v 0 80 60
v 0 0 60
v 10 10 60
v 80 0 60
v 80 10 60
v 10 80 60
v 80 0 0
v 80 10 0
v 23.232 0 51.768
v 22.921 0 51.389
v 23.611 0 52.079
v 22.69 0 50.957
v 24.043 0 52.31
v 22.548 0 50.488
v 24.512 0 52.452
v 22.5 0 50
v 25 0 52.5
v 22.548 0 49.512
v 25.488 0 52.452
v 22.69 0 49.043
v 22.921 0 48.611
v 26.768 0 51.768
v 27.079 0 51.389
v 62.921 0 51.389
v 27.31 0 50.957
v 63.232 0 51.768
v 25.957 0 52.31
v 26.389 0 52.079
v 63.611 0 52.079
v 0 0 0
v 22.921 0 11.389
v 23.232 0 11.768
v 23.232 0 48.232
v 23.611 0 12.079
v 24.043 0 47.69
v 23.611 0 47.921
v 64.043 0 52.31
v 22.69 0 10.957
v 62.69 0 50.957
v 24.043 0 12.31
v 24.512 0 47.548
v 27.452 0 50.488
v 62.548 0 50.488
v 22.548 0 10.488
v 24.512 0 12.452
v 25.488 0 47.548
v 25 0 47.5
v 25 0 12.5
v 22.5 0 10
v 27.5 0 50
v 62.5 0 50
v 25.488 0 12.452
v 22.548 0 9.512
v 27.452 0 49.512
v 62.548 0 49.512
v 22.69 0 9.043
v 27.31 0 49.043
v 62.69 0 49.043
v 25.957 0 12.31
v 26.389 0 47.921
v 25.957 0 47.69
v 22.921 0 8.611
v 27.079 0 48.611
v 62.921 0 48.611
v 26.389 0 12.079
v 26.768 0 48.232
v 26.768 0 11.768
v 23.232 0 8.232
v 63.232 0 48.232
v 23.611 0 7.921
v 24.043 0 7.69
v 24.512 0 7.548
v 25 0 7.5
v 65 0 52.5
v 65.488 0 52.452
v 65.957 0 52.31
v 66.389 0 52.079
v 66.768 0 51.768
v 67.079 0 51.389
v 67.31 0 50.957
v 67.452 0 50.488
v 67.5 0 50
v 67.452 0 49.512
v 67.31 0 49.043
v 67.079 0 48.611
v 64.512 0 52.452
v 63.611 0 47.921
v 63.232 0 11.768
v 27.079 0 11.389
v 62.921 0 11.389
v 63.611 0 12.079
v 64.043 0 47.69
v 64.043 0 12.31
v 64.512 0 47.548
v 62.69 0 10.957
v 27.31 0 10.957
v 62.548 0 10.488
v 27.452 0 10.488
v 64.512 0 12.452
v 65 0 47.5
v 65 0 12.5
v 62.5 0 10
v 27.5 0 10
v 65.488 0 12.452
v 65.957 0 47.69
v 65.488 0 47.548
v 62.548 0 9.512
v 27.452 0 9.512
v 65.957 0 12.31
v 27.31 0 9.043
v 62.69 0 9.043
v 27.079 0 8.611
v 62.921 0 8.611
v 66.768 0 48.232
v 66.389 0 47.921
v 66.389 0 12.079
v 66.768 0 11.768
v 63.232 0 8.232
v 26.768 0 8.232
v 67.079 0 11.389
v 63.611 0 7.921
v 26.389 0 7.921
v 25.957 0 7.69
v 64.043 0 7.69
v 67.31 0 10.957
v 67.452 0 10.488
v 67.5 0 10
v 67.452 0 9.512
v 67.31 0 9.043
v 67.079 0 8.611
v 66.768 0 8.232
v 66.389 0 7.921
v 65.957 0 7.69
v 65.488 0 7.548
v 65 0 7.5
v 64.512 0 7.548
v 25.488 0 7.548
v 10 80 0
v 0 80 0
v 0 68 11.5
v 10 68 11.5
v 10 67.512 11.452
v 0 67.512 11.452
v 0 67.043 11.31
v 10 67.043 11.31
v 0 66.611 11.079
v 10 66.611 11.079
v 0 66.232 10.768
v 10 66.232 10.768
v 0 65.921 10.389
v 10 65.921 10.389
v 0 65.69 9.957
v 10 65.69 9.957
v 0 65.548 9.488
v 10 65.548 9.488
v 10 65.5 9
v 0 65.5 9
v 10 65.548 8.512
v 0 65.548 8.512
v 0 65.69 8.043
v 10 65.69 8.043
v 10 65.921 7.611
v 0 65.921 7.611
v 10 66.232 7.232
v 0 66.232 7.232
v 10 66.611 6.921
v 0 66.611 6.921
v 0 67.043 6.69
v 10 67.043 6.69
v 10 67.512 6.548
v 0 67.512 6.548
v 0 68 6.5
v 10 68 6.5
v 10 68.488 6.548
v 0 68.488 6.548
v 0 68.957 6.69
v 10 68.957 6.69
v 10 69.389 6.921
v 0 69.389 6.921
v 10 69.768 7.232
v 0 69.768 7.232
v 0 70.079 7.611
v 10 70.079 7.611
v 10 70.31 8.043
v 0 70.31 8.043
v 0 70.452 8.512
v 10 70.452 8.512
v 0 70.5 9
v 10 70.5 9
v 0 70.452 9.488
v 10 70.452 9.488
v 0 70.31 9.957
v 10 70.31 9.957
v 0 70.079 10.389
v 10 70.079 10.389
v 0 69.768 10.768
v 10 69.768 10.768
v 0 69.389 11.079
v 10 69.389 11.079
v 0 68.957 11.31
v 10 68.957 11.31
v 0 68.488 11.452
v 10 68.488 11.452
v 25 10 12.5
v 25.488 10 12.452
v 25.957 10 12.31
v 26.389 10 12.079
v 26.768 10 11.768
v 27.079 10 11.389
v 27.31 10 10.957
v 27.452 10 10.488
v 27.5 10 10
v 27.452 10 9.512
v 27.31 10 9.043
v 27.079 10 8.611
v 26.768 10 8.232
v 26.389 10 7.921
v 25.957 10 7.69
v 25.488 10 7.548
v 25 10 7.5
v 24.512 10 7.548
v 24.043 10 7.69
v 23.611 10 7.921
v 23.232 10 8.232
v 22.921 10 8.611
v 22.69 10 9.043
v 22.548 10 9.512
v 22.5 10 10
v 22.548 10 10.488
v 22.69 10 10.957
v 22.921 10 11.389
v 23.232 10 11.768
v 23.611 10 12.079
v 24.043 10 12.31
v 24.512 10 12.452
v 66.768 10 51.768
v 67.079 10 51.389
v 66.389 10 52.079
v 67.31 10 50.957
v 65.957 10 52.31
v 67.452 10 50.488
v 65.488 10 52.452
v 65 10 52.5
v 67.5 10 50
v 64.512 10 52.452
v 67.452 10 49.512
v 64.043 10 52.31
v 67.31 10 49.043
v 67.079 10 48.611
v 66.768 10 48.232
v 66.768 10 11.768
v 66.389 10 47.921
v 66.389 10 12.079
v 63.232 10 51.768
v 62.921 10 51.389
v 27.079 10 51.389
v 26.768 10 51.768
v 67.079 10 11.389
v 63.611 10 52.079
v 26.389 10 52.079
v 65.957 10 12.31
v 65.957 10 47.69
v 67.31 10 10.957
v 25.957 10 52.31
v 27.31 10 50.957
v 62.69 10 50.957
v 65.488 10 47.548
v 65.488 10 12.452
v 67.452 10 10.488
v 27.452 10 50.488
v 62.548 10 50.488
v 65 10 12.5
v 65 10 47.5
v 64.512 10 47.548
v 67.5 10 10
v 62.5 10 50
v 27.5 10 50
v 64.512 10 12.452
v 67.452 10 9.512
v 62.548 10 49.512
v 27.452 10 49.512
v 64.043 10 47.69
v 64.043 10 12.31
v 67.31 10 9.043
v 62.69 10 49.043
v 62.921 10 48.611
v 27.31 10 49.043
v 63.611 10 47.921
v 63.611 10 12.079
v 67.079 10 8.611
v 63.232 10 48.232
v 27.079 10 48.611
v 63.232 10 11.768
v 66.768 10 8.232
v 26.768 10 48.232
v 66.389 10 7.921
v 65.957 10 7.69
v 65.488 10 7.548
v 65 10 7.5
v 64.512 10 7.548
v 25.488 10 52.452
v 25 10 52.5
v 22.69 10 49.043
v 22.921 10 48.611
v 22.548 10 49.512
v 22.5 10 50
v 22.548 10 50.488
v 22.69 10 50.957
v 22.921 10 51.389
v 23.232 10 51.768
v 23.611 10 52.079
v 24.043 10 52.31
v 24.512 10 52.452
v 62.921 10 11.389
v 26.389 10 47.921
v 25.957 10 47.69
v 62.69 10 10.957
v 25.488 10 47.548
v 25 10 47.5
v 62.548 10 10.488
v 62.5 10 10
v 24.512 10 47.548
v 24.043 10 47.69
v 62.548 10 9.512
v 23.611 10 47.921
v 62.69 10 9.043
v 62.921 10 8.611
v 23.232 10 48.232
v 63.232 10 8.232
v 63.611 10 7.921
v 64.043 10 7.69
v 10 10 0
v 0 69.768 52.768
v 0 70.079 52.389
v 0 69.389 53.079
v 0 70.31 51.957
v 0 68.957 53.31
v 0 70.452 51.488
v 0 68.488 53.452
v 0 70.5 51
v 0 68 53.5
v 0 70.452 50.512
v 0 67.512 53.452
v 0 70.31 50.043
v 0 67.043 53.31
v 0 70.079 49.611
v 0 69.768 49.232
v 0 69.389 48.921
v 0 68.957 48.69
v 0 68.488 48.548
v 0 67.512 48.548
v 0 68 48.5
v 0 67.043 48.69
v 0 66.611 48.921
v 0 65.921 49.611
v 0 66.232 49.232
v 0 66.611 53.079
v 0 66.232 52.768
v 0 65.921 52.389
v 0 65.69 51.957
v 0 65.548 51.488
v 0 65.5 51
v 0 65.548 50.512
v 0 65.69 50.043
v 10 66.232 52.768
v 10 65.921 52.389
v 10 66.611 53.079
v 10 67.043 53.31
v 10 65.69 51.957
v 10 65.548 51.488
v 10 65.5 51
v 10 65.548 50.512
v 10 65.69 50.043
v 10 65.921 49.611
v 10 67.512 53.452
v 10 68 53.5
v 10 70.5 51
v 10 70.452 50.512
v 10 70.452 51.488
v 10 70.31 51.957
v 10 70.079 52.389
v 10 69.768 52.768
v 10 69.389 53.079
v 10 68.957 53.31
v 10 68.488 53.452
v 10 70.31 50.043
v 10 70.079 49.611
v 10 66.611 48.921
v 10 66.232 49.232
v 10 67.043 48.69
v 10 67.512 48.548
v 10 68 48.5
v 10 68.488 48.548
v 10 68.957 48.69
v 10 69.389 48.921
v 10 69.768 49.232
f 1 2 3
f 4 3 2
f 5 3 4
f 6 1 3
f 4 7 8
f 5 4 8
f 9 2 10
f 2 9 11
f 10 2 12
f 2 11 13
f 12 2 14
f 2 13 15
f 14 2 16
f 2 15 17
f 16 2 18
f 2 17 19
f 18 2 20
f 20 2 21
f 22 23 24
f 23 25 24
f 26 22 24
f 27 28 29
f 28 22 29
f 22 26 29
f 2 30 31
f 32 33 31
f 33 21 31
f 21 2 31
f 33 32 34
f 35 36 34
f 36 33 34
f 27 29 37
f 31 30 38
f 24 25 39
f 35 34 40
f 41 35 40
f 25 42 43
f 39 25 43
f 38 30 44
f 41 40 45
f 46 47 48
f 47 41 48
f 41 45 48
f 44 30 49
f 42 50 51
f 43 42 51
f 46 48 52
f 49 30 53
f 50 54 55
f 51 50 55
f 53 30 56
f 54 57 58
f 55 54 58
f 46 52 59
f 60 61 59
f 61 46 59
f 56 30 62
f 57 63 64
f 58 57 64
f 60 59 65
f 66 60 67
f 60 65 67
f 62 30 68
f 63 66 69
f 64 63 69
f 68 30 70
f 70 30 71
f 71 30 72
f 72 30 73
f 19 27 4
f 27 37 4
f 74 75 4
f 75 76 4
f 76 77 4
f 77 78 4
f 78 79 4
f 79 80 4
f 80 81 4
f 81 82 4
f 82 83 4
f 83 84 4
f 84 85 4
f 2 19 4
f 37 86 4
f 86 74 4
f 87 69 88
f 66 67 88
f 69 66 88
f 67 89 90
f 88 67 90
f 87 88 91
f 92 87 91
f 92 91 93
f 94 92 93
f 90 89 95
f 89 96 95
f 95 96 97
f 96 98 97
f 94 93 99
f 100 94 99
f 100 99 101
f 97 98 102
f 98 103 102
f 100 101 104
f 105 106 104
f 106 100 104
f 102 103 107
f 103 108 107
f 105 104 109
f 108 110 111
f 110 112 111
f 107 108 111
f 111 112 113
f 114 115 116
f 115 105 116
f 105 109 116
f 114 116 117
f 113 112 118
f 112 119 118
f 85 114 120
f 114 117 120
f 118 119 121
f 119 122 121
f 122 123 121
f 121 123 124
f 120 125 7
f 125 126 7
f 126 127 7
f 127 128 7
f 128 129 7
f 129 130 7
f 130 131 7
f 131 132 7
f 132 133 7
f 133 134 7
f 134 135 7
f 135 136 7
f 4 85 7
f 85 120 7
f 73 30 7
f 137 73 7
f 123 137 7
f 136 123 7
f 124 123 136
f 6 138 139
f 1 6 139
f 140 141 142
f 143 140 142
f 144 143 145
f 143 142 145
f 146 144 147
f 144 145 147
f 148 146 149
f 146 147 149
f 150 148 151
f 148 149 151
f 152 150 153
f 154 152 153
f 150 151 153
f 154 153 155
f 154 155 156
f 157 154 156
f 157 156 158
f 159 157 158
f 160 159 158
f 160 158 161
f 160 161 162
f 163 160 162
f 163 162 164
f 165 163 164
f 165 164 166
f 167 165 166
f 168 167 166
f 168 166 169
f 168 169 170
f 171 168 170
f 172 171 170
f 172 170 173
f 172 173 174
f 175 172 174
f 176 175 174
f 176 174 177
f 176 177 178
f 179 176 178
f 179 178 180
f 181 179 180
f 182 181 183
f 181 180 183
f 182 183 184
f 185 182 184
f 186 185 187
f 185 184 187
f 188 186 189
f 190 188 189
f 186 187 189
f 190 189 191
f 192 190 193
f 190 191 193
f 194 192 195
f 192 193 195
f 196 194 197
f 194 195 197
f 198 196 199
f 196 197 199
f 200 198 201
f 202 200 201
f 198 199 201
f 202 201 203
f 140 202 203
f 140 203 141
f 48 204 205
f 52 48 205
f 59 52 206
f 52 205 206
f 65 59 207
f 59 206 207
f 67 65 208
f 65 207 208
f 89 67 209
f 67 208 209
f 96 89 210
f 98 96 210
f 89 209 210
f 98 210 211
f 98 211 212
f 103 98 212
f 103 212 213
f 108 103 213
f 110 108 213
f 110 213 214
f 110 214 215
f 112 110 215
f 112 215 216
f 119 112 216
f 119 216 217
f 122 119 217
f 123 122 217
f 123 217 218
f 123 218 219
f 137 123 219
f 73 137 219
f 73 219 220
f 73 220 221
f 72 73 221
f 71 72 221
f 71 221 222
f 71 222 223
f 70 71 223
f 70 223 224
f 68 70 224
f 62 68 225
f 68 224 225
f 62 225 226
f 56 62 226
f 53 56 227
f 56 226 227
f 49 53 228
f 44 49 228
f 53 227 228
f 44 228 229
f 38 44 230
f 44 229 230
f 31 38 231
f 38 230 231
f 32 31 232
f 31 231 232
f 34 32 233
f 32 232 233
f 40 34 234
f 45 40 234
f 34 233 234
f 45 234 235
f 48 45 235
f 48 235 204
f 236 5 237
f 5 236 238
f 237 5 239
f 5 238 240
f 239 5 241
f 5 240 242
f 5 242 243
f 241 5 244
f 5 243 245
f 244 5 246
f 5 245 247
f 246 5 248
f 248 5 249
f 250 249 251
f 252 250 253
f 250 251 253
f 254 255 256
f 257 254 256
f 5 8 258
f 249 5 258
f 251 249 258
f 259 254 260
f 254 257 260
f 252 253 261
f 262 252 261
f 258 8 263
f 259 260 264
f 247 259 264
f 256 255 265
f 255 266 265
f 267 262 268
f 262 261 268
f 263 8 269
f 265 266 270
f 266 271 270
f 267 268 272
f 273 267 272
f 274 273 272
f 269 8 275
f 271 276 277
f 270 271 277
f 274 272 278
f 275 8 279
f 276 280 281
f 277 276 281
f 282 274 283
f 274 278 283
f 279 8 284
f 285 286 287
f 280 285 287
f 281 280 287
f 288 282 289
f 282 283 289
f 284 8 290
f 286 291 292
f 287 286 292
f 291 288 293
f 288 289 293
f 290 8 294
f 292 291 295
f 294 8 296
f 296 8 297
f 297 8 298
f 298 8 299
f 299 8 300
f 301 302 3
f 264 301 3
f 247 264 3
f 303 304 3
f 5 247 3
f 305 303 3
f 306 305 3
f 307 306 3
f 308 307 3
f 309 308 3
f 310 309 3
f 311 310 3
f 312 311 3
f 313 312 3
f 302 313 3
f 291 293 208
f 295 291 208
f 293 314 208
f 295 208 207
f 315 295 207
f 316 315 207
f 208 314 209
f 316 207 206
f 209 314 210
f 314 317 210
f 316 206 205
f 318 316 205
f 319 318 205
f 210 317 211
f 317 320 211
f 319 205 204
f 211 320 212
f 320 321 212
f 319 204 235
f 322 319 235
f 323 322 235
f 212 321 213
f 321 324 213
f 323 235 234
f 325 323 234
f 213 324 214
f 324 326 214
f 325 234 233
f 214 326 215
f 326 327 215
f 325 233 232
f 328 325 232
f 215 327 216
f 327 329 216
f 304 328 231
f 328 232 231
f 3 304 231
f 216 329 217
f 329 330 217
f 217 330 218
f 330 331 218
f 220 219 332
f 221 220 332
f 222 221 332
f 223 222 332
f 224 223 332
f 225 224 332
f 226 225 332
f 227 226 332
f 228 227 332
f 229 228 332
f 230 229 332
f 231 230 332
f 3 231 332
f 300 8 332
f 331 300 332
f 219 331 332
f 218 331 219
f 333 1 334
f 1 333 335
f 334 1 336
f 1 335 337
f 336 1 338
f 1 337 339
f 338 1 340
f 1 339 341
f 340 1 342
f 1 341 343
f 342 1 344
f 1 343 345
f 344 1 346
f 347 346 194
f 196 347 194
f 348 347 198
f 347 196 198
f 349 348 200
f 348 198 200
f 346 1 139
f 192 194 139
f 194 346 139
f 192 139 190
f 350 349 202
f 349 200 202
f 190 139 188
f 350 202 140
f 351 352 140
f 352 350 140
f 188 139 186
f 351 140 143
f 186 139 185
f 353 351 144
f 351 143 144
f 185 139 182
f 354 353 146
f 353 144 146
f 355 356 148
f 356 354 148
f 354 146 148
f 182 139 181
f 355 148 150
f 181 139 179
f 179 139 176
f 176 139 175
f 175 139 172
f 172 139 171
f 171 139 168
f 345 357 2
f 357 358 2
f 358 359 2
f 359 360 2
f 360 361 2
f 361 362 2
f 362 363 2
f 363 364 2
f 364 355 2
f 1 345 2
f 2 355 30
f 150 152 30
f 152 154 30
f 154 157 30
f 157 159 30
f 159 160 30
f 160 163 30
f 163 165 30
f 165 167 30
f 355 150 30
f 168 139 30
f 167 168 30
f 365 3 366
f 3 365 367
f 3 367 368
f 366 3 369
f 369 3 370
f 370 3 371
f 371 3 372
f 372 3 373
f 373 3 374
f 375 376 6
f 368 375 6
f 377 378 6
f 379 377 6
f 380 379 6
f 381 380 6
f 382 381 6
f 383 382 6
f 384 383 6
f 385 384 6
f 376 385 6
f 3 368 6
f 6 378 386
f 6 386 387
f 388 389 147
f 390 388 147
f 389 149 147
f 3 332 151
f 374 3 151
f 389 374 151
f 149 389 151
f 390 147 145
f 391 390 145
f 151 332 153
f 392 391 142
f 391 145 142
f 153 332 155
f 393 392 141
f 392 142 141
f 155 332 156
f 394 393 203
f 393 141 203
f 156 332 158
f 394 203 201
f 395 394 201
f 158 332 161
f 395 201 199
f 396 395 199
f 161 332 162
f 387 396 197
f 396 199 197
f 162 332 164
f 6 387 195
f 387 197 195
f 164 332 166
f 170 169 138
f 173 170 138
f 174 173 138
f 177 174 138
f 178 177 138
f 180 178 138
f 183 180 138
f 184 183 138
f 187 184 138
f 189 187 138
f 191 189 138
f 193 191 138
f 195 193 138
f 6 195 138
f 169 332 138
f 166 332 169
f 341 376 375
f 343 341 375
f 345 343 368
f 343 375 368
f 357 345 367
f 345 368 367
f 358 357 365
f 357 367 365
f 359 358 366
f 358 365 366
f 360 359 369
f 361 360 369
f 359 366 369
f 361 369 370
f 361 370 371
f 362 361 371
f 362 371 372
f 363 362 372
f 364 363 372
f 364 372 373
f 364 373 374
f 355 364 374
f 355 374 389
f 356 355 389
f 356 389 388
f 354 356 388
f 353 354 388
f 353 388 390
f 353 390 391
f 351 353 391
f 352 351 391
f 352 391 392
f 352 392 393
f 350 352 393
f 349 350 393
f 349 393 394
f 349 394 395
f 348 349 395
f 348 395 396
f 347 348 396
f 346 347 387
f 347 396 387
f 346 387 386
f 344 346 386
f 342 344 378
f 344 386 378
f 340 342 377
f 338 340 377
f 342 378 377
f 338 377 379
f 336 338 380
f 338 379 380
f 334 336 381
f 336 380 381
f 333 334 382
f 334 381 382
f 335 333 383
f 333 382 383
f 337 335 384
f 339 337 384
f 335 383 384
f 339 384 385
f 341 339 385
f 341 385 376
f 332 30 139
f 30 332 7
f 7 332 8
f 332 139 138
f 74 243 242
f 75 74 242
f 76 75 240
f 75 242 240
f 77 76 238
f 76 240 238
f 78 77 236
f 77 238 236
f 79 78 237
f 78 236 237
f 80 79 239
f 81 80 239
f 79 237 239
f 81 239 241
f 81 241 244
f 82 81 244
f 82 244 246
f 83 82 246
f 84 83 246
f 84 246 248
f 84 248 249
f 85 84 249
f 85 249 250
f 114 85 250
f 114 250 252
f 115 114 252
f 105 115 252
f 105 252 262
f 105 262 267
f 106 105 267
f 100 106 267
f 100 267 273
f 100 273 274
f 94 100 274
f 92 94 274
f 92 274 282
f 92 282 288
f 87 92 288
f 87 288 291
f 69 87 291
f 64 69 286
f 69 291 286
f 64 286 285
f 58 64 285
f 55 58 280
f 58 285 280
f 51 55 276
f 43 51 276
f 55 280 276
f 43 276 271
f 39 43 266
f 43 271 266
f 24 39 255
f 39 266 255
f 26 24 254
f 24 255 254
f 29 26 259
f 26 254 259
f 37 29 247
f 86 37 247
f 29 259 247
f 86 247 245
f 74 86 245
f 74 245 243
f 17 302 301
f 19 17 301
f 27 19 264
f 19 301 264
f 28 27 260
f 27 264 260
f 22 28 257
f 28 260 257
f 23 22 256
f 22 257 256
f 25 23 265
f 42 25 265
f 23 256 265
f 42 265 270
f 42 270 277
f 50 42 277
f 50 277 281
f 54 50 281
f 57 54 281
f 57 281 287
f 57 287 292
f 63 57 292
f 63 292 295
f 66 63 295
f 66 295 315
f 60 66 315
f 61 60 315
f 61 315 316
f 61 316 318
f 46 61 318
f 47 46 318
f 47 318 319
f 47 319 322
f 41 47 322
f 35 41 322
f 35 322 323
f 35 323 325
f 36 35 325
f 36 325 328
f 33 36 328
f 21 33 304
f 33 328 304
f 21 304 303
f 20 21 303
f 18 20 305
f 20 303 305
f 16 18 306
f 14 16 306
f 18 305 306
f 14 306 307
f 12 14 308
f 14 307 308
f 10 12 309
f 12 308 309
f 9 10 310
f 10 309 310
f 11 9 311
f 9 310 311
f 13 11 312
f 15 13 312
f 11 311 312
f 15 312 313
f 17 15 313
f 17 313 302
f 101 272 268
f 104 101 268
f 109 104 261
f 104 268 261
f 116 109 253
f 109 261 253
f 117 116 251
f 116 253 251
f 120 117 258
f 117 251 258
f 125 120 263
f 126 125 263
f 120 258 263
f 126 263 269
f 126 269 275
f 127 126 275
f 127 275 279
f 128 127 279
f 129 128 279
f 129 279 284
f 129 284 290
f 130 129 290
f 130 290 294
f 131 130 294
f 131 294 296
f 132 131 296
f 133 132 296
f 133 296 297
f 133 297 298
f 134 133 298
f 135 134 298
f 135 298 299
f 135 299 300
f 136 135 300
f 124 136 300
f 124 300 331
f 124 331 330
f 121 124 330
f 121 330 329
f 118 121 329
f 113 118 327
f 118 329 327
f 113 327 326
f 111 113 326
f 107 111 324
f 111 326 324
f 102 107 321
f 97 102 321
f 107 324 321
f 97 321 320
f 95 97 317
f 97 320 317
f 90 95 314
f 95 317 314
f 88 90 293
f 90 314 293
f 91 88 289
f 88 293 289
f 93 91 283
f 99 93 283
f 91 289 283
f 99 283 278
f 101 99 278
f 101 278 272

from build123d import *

# Parameters (mm, degrees)
EXTRUDE_1_DEPTH        = 60
HOLE_WIZARD_M6_1_D     = 5
HOLE_WIZARD_M6_1_DEPTH = 15
HOLE_WIZARD_M6_1_TIP   = 1.502151548
HOLE_WIZARD_M6_2_D     = 5
HOLE_WIZARD_M6_2_DEPTH = 15
HOLE_WIZARD_M6_2_TIP   = 1.502151548


with BuildPart() as part:
    # 草图1 → 凸台-拉伸1 (new body)
    with BuildSketch(Plane.XY):
        Polygon((0, 80), (0, 0), (80, 0), (80, 10), (10, 10), (10, 80), align=None)
    extrude(amount=EXTRUDE_1_DEPTH)

    # M6 螺纹孔1
    with Locations(Plane(origin=(65, 0, 50), x_dir=(0, 0, -1), z_dir=(0, -1, 0))):
        with Locations((0, 0), (40, 0), (40, -40), (0, -40)):
            Hole(HOLE_WIZARD_M6_1_D / 2, depth=HOLE_WIZARD_M6_1_DEPTH)
            with Locations((0, 0, -(HOLE_WIZARD_M6_1_DEPTH + HOLE_WIZARD_M6_1_TIP / 2))):  # 118° drill point
                Cone(0, HOLE_WIZARD_M6_1_D / 2, HOLE_WIZARD_M6_1_TIP, mode=Mode.SUBTRACT)

    # M6 螺纹孔2
    with Locations(Plane(origin=(0, 68, 9), x_dir=(0, 0, -1), z_dir=(-1, 0, 0))):
        with Locations((0, 0), (-42, 0)):
            Hole(HOLE_WIZARD_M6_2_D / 2, depth=HOLE_WIZARD_M6_2_DEPTH)
            with Locations((0, 0, -(HOLE_WIZARD_M6_2_DEPTH + HOLE_WIZARD_M6_2_TIP / 2))):  # 118° drill point
                Cone(0, HOLE_WIZARD_M6_2_D / 2, HOLE_WIZARD_M6_2_TIP, mode=Mode.SUBTRACT)


solid = part.part
